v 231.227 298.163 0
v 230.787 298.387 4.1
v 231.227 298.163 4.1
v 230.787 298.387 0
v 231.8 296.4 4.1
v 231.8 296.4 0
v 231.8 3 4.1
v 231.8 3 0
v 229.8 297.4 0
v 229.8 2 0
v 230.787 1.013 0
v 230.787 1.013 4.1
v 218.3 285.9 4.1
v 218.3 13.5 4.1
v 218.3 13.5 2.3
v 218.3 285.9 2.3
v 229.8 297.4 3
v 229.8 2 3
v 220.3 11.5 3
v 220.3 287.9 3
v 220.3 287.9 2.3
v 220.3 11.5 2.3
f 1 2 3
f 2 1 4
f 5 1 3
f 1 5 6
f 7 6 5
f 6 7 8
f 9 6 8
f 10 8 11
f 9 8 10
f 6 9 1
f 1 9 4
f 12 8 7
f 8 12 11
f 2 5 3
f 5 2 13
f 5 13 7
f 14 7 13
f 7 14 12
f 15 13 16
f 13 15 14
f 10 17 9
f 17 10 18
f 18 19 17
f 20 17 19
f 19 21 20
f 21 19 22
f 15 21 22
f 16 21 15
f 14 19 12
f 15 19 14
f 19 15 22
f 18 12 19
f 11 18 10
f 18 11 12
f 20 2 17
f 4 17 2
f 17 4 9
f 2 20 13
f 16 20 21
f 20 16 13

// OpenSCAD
// ============================================================
// Front Bezel - Right Side (mitered 45° corners)
// ============================================================
include <common.scad>

module bezel_right() {
    bezel_side("right");
}

bezel_right();
